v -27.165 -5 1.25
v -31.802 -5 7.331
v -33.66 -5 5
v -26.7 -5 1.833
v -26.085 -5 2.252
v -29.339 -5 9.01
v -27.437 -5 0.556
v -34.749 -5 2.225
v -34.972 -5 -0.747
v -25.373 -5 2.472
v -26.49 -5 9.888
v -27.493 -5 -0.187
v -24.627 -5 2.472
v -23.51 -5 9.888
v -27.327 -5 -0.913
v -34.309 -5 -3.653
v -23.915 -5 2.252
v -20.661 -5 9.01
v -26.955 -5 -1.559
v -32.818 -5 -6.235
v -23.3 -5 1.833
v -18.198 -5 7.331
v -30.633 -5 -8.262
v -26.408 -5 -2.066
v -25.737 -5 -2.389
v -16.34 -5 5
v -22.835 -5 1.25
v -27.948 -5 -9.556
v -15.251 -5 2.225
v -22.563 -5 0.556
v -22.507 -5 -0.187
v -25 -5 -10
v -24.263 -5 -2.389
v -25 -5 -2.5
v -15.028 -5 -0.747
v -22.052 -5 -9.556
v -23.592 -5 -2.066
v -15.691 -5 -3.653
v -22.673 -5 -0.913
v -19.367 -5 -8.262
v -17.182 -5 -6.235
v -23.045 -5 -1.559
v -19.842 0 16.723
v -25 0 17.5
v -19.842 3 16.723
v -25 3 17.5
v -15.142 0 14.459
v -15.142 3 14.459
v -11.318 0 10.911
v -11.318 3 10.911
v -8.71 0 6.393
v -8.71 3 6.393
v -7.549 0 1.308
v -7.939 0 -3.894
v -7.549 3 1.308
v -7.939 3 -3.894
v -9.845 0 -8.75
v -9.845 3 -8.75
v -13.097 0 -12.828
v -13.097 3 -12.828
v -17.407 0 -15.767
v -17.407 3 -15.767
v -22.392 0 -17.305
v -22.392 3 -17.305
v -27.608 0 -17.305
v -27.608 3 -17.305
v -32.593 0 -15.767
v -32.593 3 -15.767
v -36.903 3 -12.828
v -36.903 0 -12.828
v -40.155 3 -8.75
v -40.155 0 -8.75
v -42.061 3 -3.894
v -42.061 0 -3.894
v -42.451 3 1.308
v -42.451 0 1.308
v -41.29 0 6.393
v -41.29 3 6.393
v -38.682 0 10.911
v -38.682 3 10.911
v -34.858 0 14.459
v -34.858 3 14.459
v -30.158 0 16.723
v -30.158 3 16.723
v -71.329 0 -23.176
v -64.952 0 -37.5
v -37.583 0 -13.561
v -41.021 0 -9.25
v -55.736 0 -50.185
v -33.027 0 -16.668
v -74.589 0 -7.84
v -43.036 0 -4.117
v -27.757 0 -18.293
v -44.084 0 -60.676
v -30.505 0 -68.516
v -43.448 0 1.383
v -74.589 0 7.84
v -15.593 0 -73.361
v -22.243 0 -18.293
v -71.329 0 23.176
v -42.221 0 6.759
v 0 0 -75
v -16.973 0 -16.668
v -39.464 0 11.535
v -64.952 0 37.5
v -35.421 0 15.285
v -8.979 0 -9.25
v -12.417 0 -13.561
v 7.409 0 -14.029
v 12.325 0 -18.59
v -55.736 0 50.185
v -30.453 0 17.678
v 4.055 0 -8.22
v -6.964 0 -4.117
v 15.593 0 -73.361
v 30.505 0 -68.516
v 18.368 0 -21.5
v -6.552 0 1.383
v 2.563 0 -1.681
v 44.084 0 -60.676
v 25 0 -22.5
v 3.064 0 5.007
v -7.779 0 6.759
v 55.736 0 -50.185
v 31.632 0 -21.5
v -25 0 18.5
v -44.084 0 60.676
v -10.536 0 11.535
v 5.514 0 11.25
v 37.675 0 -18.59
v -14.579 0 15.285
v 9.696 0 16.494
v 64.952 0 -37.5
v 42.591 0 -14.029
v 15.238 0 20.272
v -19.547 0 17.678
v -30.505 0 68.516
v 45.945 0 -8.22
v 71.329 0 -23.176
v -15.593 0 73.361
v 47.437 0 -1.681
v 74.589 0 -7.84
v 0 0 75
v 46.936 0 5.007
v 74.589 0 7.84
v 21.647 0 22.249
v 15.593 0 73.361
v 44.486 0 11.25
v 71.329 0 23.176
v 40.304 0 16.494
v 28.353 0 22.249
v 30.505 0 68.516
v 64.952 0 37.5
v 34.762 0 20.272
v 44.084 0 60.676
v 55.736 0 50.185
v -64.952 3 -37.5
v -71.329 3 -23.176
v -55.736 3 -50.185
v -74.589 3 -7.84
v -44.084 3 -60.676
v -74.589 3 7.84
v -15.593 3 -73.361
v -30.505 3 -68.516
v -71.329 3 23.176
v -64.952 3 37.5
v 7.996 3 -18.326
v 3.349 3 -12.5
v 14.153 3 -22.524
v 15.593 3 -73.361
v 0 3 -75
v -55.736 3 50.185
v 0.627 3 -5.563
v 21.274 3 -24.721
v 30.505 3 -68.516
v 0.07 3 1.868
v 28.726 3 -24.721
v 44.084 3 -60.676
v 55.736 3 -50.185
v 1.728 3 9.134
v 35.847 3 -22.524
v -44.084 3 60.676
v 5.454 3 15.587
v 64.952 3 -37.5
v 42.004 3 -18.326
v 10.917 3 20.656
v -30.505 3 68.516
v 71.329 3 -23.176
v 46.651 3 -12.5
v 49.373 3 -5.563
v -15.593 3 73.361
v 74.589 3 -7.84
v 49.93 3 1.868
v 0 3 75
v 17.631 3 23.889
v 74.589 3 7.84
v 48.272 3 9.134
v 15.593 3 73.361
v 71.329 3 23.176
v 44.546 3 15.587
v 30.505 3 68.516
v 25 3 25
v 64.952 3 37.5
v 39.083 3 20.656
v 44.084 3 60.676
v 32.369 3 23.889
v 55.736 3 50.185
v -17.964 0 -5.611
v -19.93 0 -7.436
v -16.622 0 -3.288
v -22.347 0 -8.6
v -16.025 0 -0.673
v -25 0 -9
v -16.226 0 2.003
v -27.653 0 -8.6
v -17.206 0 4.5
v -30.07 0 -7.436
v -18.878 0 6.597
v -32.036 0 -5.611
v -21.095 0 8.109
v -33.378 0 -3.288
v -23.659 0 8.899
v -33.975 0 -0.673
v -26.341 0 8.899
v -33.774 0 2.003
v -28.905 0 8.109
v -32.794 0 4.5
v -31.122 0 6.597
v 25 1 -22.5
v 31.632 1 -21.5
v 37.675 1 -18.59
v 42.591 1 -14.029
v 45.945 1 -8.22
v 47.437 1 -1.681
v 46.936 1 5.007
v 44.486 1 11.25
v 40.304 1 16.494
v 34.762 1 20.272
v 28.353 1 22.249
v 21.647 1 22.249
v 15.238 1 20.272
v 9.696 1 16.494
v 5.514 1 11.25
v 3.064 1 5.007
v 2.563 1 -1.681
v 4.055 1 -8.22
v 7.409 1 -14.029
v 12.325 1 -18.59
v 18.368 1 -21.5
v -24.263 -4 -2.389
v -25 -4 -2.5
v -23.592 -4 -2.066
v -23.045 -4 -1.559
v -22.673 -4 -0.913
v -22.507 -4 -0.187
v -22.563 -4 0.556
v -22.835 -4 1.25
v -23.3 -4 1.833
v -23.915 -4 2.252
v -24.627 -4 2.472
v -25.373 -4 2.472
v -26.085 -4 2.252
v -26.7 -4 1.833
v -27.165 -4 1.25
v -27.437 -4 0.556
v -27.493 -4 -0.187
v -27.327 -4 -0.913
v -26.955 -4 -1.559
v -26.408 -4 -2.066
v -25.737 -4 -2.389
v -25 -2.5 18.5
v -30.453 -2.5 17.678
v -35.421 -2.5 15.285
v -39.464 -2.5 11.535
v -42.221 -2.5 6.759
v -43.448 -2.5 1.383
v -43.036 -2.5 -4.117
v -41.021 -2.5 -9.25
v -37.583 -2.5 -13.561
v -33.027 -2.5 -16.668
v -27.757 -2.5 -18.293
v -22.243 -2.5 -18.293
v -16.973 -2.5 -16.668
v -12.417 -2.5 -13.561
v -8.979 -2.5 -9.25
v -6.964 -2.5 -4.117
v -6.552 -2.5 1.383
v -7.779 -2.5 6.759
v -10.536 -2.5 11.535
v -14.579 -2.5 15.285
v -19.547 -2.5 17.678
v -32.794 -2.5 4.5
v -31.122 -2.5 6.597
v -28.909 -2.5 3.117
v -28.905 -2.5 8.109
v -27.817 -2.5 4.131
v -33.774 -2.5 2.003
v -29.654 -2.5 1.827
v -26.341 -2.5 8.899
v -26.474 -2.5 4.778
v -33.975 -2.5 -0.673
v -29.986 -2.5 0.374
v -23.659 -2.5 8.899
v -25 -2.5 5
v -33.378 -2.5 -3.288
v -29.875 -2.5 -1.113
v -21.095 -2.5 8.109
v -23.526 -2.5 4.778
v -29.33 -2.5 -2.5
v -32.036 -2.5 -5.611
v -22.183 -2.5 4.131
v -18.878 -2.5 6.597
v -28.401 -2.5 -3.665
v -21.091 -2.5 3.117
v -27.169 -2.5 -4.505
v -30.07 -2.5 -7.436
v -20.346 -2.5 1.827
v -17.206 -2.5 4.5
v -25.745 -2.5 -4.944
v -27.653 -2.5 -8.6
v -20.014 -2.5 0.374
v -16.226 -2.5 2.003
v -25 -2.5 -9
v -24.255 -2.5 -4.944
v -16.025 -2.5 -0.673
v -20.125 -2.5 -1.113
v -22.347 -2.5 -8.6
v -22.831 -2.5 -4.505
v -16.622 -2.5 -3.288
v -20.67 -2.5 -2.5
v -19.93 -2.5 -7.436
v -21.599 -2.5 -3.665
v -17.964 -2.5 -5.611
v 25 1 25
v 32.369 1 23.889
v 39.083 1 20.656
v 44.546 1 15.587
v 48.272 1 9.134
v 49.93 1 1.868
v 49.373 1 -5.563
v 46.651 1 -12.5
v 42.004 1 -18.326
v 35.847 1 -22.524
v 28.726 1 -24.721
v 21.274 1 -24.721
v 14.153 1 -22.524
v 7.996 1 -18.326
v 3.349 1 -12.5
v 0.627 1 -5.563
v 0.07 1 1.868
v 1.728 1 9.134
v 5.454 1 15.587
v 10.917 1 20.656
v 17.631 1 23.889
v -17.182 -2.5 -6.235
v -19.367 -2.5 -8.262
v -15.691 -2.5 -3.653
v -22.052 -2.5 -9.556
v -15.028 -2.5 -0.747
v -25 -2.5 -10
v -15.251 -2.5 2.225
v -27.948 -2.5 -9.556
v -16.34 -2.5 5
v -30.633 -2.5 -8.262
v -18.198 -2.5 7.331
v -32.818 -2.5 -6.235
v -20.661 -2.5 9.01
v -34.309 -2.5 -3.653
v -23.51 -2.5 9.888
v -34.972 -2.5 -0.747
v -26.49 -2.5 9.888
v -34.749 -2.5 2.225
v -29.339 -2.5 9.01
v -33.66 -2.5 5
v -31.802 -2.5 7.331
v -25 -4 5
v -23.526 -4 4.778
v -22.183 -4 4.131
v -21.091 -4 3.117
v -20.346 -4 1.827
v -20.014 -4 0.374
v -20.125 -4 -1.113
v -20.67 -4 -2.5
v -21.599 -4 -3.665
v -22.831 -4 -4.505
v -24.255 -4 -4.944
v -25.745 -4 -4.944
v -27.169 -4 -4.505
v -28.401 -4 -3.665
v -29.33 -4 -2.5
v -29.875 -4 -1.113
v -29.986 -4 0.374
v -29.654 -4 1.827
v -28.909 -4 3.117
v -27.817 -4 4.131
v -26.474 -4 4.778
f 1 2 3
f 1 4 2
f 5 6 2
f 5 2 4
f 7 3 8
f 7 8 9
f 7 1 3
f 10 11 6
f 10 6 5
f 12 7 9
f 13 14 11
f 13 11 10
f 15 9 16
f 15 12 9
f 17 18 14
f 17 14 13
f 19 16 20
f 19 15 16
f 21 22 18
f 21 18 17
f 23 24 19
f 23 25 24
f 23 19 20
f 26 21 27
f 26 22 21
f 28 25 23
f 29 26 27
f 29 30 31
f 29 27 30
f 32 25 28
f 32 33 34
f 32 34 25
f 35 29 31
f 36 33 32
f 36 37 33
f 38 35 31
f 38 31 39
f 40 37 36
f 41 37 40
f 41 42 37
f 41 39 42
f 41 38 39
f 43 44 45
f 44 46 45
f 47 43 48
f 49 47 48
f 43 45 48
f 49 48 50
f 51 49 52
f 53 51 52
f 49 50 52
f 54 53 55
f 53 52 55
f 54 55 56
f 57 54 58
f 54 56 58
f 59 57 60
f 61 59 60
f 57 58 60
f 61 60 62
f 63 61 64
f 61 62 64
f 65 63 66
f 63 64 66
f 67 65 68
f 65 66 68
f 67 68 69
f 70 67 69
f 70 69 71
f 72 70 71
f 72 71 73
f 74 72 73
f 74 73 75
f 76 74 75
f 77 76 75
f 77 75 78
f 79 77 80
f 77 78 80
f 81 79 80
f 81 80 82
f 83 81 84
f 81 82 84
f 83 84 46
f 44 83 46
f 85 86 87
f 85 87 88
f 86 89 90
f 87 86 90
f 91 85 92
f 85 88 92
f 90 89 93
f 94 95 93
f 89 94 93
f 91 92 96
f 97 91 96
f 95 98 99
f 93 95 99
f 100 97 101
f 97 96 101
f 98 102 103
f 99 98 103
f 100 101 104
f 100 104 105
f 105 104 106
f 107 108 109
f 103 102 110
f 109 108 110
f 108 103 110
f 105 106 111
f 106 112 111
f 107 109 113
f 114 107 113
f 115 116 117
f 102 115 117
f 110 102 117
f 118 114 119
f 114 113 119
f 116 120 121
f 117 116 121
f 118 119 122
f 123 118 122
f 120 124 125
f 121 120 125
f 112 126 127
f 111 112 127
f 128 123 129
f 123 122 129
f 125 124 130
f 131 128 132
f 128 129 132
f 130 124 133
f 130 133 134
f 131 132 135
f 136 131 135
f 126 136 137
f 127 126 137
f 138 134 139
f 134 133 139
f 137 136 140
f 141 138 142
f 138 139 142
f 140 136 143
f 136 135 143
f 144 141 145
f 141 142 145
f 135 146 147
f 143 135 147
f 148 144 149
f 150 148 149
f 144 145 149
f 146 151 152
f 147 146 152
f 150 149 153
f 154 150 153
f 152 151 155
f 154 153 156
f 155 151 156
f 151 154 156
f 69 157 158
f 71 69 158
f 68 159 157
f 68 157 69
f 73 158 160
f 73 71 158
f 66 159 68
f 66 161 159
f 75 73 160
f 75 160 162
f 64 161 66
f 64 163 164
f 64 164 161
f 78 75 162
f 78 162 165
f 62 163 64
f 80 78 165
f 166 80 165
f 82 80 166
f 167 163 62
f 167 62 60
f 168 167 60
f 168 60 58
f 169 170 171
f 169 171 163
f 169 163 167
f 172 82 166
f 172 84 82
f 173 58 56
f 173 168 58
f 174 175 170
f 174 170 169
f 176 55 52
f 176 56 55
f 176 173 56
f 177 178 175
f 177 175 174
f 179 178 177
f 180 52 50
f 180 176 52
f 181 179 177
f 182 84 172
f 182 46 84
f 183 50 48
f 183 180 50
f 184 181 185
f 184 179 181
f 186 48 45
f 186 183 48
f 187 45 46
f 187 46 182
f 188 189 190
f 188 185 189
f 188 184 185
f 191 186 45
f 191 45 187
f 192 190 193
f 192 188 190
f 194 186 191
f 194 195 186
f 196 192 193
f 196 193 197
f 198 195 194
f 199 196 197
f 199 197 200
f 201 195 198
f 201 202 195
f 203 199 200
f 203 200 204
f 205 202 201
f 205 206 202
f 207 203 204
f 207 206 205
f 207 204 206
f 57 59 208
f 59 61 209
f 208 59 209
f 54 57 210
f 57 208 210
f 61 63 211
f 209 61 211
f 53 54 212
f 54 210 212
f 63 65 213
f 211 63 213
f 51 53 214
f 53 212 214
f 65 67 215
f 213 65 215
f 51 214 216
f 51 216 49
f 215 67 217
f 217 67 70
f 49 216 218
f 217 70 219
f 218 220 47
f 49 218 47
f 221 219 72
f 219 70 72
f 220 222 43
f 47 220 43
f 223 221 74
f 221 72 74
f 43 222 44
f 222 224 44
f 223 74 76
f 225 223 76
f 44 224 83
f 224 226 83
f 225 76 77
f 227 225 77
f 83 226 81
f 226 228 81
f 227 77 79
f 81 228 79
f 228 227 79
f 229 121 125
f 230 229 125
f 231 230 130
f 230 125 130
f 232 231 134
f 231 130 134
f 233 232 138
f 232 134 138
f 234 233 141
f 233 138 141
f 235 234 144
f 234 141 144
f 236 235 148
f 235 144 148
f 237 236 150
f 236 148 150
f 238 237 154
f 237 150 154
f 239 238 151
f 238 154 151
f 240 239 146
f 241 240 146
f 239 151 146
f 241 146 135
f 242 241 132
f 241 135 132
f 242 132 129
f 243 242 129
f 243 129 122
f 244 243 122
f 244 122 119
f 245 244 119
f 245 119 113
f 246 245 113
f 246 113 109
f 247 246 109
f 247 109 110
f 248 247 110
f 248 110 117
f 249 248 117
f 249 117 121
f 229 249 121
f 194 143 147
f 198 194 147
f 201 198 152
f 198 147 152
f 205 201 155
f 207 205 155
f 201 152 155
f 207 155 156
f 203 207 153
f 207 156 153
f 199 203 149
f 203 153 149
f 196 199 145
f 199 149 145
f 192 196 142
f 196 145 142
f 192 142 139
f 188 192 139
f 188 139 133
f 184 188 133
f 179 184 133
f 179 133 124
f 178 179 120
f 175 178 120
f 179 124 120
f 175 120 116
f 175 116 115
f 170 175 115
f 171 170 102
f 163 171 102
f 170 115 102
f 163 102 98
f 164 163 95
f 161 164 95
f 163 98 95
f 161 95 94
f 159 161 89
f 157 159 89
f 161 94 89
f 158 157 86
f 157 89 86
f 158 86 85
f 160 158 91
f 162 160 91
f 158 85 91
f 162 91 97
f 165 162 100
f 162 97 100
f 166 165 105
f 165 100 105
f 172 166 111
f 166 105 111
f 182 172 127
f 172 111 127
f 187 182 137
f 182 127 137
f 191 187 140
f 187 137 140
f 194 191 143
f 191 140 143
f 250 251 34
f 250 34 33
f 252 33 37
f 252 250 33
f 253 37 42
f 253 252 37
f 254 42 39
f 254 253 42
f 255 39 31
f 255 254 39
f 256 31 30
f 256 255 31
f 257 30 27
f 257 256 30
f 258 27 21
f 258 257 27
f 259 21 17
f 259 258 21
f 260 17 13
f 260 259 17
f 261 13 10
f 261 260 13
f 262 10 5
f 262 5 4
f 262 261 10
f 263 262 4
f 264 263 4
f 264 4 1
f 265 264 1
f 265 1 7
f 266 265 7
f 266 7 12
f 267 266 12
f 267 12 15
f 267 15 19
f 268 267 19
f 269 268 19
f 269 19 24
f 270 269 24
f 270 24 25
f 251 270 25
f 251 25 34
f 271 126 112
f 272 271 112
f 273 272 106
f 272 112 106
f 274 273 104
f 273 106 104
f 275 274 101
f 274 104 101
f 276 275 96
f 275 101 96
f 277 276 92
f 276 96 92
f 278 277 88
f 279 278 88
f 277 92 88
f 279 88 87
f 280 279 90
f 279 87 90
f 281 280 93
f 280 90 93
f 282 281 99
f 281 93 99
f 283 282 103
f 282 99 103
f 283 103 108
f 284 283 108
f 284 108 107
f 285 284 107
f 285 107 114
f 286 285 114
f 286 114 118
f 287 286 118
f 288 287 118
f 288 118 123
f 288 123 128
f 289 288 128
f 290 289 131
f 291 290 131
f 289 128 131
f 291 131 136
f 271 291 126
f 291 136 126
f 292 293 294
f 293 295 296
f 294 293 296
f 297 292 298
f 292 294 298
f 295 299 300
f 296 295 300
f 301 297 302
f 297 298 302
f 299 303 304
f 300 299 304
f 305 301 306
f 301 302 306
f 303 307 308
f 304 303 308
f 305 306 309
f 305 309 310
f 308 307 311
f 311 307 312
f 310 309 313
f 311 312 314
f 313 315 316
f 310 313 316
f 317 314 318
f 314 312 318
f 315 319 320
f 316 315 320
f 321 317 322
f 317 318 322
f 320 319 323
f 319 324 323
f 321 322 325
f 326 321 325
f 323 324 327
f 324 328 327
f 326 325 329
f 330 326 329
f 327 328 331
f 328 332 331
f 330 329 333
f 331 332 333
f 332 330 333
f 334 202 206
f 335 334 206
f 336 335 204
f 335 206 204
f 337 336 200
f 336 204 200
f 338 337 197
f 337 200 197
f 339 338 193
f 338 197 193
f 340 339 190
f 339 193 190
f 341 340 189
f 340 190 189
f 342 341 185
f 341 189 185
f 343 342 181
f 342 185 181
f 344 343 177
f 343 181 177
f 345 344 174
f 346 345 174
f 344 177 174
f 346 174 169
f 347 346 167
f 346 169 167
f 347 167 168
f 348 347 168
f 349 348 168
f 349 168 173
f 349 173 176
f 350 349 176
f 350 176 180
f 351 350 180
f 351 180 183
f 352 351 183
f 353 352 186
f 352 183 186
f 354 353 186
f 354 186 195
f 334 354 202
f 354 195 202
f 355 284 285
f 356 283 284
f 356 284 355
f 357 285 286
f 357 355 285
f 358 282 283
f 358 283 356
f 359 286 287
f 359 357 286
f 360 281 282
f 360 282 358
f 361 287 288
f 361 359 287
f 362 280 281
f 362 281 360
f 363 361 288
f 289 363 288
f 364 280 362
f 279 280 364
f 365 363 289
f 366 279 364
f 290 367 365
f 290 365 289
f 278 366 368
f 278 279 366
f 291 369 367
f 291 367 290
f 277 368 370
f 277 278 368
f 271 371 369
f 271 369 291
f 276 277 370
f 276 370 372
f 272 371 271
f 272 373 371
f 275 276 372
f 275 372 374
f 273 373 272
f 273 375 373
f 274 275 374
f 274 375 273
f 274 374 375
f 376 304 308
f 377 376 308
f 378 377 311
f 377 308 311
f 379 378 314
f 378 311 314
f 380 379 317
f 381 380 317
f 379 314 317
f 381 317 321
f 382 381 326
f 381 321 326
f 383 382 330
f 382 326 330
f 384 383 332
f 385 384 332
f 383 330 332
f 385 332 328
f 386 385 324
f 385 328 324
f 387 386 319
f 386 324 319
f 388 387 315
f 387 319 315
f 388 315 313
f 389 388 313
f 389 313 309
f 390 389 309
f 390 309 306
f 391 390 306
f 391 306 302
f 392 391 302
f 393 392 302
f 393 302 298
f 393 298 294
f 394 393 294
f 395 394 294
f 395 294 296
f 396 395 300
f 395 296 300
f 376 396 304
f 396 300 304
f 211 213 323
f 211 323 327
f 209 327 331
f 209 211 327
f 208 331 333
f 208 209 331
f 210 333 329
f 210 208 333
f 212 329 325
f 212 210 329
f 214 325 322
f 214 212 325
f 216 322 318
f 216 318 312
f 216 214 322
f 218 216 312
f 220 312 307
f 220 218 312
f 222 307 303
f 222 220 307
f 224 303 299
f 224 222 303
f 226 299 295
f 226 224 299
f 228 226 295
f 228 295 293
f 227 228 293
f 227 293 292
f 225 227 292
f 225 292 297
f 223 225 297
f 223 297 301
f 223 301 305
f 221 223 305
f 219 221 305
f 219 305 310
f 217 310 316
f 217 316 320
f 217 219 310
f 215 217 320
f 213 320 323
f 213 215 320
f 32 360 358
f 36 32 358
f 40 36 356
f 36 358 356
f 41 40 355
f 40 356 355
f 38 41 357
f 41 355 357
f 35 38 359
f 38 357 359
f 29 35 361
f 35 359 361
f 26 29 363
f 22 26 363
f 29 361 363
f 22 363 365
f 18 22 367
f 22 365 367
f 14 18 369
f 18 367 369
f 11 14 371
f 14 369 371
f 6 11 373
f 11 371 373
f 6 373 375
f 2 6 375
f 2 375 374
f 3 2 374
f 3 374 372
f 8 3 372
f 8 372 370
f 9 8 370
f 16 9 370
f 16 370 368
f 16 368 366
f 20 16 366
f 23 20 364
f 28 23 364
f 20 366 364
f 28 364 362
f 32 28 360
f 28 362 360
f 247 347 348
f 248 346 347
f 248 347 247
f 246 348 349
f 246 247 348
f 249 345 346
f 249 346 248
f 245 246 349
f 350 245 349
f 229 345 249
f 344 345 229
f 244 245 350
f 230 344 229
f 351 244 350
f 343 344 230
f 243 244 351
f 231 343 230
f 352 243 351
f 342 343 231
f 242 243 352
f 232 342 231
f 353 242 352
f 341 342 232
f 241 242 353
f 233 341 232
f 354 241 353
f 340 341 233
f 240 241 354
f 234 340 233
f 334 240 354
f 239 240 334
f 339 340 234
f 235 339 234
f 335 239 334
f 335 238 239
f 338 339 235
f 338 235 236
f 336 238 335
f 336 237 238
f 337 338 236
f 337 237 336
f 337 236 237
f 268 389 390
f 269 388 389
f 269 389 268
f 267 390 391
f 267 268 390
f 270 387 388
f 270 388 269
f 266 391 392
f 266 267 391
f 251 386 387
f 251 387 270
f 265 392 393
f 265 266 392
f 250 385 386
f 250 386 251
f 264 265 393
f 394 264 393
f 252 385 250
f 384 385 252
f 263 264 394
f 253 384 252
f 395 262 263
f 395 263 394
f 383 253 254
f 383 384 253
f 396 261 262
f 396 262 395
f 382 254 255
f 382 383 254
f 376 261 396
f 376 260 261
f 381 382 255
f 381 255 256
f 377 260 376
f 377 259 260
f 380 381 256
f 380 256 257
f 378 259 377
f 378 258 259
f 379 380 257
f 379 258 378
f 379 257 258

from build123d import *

# Parameters (mm, degrees)
SKETCH_1_R          = 75
EXTRUDE_1_DEPTH     = 3
SKETCH_2_R          = 17.5
SKETCH_2_R_2        = 25
CUT_EXTRUDE_1_DEPTH = 2
SKETCH_3_R          = 22.5
CUT_EXTRUDE_2_DEPTH = 2
SKETCH_12_R         = 17.5
CUT_EXTRUDE_7_DEPTH = 1
SKETCH_15_R         = 18.5
SKETCH_15_R_2       = 9
EXTRUDE_6_DEPTH     = 2.5
SKETCH_16_R         = 10
SKETCH_16_R_2       = 2.5
EXTRUDE_7_DEPTH     = 2.5
SKETCH_17_R         = 5
CUT_EXTRUDE_9_DEPTH = 1.5


with BuildPart() as part:
    # 草图1 → 凸台-拉伸1 (new body)
    with BuildSketch(Plane(origin=(0, 0, 0), x_dir=(1, 0, 0), z_dir=(0, 1, 0))):
        with Locations(Location((0, 0, 0), (0, 0, 270))):
            Circle(SKETCH_1_R)
    extrude(amount=EXTRUDE_1_DEPTH)

    # 草图2 → 切除-拉伸1 (cut)
    with BuildSketch(Plane(origin=(0, 3, 0), x_dir=(1, 0, 0), z_dir=(0, 1, 0))):
        with Locations(Location((-25, 0, 0), (0, 0, 270))):
            Circle(SKETCH_2_R)
        with Locations(Location((25, 0, 0), (0, 0, 270))):
            Circle(SKETCH_2_R_2)
    extrude(amount=-CUT_EXTRUDE_1_DEPTH, mode=Mode.SUBTRACT)

    # 草图3 → 切除-拉伸2 (cut)
    with BuildSketch(Plane.XZ):
        with Locations(Location((25, 0, 0), (0, 0, 270))):
            Circle(SKETCH_3_R)
    extrude(amount=-CUT_EXTRUDE_2_DEPTH, mode=Mode.SUBTRACT)

    # 草图12 → 切除-拉伸7 (cut)
    with BuildSketch(Plane(origin=(0, 1, 0), x_dir=(1, 0, 0), z_dir=(0, 1, 0))):
        with Locations(Location((-25, 0, 0), (0, 0, 270))):
            Circle(SKETCH_12_R)
    extrude(amount=-CUT_EXTRUDE_7_DEPTH, mode=Mode.SUBTRACT)

    # 草图15 → 凸台-拉伸6 (add)
    with BuildSketch(Plane.XZ):
        with Locations(Location((-25, 0, 0), (0, 0, 90))):
            Circle(SKETCH_15_R)
        with Locations(Location((-25, 0, 0), (0, 0, 270))):
            Circle(SKETCH_15_R_2, mode=Mode.SUBTRACT)
    extrude(amount=EXTRUDE_6_DEPTH)

    # 草图16 → 凸台-拉伸7 (add)
    with BuildSketch(Plane.XZ.offset(2.5)):
        with Locations(Location((-25, 0, 0), (0, 0, 270))):
            Circle(SKETCH_16_R)
        with Locations(Location((-25, 0, 0), (0, 0, 270))):
            Circle(SKETCH_16_R_2, mode=Mode.SUBTRACT)
    extrude(amount=EXTRUDE_7_DEPTH)

    # 草图17 → 切除-拉伸9 (cut)
    with BuildSketch(Plane(origin=(0, -2.5, 0), x_dir=(1, 0, 0), z_dir=(0, 1, 0))):
        with Locations(Location((-25, 0, 0), (0, 0, 270))):
            Circle(SKETCH_17_R)
    extrude(amount=-CUT_EXTRUDE_9_DEPTH, mode=Mode.SUBTRACT)


solid = part.part
